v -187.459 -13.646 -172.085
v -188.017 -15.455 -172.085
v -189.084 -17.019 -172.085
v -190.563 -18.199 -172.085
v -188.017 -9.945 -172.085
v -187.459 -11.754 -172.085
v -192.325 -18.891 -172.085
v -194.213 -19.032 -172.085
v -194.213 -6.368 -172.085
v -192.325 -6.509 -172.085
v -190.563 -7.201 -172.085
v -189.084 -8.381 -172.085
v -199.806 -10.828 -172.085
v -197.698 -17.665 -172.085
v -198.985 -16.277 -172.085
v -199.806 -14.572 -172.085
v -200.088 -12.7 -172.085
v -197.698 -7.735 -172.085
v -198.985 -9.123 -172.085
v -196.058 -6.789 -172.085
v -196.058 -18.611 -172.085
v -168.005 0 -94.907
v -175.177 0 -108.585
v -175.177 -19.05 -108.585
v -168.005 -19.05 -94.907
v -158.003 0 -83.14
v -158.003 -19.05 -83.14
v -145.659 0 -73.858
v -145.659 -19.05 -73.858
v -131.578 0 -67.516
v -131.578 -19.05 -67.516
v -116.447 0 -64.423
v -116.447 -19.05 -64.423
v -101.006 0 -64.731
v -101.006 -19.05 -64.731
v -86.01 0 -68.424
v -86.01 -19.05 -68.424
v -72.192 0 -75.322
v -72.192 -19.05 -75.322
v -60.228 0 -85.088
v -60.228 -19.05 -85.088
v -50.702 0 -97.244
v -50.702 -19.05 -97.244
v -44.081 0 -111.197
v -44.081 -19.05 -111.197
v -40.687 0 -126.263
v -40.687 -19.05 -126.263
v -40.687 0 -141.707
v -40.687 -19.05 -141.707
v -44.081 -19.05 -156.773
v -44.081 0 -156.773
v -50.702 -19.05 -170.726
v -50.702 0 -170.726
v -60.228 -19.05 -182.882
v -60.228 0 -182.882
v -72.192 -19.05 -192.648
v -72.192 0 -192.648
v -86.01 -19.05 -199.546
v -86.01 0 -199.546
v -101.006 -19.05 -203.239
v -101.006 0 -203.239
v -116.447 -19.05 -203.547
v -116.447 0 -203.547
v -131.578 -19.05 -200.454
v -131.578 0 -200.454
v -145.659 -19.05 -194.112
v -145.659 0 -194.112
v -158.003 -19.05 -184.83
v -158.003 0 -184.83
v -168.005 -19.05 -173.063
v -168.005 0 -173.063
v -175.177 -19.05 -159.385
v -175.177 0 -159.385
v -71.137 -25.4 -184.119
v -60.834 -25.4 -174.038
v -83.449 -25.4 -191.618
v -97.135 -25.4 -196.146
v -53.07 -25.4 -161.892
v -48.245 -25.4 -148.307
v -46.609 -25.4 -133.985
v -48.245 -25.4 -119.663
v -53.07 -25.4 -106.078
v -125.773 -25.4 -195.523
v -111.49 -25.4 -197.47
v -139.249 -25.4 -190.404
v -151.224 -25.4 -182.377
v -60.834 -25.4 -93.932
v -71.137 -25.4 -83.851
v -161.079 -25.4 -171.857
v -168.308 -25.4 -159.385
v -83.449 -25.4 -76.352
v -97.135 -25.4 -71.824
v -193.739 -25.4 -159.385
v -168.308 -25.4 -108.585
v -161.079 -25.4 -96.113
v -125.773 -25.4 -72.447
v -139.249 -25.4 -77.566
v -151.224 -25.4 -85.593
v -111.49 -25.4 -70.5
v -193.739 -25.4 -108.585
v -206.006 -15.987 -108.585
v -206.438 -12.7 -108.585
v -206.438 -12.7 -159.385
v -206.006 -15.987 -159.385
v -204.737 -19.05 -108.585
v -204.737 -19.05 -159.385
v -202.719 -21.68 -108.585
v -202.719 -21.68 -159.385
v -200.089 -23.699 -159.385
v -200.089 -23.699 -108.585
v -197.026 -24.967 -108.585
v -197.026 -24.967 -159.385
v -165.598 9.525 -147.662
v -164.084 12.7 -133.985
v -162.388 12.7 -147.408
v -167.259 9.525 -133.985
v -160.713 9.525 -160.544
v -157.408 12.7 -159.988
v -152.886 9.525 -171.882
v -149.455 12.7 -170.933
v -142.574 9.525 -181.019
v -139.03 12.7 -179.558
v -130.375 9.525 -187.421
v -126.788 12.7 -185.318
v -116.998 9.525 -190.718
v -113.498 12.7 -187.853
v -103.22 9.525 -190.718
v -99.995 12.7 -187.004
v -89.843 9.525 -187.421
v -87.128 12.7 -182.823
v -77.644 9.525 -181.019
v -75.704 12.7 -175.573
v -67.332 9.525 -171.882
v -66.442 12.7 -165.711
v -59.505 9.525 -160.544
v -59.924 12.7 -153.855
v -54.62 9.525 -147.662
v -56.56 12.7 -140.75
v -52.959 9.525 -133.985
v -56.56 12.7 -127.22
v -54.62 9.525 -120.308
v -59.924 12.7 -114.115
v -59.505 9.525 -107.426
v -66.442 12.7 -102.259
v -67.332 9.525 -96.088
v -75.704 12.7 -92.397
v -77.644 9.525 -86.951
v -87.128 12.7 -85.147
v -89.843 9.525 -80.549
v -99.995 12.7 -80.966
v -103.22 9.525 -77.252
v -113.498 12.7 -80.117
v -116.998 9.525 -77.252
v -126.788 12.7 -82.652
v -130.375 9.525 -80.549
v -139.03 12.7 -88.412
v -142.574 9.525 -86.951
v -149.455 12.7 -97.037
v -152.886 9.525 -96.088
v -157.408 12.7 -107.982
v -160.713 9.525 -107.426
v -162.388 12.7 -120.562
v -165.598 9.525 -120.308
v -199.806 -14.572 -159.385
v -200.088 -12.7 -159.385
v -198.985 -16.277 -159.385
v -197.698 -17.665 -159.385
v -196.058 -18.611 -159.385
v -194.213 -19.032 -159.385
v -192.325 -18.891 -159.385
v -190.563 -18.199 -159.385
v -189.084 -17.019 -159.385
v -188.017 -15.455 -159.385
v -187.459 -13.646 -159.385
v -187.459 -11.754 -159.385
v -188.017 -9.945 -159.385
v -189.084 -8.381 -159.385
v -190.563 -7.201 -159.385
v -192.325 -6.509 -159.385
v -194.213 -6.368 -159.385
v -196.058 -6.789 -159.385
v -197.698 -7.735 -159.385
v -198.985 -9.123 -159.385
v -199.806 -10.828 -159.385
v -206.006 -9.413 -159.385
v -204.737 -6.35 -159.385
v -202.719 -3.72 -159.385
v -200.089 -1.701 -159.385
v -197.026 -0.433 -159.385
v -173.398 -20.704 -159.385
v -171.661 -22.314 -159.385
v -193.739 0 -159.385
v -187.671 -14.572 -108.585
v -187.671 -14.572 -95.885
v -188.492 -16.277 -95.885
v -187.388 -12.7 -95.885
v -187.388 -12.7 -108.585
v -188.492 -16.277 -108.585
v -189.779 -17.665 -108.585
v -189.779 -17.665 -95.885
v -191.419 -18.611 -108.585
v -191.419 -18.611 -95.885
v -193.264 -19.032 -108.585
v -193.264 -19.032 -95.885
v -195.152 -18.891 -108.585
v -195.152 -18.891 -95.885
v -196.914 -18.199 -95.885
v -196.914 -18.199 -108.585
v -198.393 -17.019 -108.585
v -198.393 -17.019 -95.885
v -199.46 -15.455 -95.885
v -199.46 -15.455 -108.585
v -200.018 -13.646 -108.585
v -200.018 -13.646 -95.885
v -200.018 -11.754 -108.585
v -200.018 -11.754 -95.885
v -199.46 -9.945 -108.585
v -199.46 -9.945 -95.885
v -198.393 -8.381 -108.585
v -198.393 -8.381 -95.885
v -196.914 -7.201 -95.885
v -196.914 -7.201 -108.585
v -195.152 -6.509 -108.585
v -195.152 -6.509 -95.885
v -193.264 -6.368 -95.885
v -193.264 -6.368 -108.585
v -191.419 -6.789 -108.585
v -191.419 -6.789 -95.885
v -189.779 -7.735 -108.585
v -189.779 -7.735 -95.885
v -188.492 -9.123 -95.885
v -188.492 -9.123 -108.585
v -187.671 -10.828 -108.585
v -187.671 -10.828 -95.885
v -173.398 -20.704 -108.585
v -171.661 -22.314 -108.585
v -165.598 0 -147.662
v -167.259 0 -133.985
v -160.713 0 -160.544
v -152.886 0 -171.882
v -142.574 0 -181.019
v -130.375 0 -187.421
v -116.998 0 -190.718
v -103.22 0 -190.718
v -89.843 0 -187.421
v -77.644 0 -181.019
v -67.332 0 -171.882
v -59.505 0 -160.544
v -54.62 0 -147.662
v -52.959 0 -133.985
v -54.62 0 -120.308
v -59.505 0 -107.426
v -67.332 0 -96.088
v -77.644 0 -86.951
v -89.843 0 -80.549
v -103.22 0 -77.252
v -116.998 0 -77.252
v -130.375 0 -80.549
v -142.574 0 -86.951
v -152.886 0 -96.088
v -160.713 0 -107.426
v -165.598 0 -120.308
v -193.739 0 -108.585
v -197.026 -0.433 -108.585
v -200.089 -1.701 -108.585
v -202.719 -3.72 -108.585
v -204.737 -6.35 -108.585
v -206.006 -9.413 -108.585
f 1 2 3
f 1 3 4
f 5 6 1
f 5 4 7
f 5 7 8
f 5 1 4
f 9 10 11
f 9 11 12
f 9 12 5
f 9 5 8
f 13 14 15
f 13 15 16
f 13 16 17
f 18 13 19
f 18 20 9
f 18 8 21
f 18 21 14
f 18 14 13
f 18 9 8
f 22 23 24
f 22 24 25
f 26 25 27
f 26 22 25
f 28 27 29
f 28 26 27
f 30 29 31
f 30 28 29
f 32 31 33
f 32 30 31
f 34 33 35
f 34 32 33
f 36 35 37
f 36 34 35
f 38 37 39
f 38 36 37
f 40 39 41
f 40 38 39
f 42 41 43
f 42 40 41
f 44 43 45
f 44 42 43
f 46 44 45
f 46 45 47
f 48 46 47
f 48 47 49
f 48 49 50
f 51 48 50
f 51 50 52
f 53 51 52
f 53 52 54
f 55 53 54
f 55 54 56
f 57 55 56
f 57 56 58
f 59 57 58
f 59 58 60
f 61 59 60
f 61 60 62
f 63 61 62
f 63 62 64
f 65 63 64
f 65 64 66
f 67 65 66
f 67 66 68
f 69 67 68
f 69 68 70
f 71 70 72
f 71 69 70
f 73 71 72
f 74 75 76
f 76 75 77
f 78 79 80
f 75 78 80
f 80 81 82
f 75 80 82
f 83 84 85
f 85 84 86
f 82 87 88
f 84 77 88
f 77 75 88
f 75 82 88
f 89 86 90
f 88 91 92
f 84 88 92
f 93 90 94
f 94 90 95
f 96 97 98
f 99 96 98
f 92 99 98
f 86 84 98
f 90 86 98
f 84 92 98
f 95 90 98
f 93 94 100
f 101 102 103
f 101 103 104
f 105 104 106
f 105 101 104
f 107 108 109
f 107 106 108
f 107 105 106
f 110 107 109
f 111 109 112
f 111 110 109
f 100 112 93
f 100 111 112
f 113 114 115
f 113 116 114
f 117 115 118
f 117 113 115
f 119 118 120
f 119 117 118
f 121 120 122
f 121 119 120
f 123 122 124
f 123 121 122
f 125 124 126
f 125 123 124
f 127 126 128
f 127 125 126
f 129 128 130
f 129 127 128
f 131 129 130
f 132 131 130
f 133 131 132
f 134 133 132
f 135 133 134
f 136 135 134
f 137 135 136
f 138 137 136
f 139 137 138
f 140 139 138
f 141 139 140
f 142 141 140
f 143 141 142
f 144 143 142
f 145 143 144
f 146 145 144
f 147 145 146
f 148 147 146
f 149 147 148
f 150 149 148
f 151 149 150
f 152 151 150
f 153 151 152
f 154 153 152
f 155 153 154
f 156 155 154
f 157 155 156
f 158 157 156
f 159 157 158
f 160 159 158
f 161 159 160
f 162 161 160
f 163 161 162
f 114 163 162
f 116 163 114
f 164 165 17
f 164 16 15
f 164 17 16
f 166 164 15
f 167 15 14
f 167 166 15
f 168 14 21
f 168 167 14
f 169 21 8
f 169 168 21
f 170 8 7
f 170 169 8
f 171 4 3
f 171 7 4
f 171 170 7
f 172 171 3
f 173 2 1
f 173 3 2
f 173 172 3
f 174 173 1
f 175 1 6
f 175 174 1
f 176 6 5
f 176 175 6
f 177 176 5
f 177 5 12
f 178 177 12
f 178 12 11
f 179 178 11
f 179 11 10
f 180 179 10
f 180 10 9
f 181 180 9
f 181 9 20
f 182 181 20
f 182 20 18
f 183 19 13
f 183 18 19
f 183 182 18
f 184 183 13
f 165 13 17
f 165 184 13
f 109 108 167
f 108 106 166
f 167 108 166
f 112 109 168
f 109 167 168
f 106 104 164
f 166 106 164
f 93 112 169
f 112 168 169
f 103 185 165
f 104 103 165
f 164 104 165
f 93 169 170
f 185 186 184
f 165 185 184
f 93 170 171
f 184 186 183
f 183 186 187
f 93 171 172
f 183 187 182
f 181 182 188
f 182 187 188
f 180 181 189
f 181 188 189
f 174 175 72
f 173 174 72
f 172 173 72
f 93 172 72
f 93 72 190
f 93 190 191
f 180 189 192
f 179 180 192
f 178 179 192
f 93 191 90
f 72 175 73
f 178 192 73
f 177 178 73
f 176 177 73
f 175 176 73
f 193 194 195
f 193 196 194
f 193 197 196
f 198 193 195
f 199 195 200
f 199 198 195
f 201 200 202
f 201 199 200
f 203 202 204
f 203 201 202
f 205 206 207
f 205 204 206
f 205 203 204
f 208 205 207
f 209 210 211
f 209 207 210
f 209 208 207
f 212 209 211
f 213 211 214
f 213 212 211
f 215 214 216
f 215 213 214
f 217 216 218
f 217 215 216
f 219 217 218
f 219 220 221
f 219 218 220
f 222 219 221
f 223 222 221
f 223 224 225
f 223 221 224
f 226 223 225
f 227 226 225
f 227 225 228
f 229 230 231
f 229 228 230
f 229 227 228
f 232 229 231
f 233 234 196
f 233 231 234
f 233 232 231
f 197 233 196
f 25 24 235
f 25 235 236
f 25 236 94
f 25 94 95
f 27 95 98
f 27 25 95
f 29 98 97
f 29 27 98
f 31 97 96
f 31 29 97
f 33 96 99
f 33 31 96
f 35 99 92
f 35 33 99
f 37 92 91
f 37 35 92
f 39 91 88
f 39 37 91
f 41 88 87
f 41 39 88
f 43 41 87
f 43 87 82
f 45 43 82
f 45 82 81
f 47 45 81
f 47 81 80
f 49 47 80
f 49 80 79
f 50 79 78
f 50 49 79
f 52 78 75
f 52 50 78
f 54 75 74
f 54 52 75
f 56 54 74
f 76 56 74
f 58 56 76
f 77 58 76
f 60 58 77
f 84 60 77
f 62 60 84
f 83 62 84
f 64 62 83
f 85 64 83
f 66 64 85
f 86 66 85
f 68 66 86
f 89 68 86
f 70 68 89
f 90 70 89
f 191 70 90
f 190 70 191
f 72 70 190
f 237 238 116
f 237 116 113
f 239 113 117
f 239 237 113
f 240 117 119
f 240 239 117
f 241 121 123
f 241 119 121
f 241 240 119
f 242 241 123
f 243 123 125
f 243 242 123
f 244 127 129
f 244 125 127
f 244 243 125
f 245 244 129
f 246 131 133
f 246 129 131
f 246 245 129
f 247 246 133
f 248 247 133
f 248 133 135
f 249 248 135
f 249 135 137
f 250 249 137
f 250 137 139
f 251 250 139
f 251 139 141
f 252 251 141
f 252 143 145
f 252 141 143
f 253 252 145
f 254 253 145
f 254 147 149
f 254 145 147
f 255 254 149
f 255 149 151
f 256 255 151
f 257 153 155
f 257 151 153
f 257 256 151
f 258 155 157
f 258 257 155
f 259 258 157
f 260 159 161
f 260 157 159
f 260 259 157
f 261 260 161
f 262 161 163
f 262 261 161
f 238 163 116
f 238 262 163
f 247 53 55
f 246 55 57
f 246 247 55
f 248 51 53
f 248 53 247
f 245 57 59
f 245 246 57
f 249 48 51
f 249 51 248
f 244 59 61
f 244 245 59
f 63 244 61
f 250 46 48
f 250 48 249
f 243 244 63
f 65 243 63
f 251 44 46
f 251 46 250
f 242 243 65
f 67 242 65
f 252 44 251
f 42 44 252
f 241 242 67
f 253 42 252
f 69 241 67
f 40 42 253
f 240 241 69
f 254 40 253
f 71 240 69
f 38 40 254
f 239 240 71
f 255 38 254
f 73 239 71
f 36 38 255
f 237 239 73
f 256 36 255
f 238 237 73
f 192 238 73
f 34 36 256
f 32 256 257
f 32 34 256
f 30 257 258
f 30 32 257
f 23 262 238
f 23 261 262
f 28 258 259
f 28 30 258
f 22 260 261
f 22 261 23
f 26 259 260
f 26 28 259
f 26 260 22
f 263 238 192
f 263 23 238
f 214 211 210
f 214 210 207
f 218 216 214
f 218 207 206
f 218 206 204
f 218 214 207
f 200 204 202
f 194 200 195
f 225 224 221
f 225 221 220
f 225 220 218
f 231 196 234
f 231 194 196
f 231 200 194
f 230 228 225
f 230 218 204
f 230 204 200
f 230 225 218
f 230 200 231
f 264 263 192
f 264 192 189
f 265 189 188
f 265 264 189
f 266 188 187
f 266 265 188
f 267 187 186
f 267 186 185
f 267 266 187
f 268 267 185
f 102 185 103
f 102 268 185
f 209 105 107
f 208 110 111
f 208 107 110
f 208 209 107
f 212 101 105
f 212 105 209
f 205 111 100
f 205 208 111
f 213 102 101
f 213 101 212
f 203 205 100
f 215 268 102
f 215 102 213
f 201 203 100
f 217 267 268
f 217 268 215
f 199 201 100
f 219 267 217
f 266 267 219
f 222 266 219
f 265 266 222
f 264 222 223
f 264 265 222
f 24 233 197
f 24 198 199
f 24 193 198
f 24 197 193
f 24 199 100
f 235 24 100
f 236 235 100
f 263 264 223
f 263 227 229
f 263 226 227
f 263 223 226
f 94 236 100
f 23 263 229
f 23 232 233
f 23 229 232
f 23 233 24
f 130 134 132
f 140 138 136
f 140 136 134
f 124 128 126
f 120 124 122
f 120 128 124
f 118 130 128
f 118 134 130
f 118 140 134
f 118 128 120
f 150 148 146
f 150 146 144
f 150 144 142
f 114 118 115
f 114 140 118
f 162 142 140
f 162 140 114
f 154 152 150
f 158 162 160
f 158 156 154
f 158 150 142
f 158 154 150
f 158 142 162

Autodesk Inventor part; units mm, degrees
ref_plane "YZ Plane" through (0, 0, 0) normal (1, 0, 0) x (0, 1, 0)
ref_plane "XZ Plane" through (0, 0, 0) normal (0, 1, 0) x (-1, 0, 0)
ref_plane "XY Plane" through (0, 0, 0) normal (0, 0, 1) x (1, 0, 0)
sketch "Sketch1" plane through (0, 0, 0) normal (0, 1, 0) x (-1, 0, 0)
  circle A0 centre (110.109, -133.985) radius 57.15
  circle A1 centre (110.109, -133.985) radius 50.8
  circle A2 centre (110.109, -133.985) radius 69.85
  line L0 (206.4385, -159.385) -> (175.1771, -159.385)
  line L1 (206.4385, -159.385) -> (206.4385, -108.585)
  line L2 (206.4385, -108.585) -> (175.1771, -108.585)
  point P0 (0, 0)
  dimension "d51" = 139.7
  dimension "d11" = 114.3
  dimension "d12" = 101.6
extrude "Extrusion11" add sketch "Sketch1" against normal blind 25.4 contours A0 | A1 | A2 | A2 L2 L1 L0
extrude "Extrusion12" add sketch "Sketch1" along normal blind 12.7 contours A0 | A1
chamfer "Chamfer1" distance 3.175 angle 45 1 edges at (-52.959, 12.7, -133.985)
chamfer "Chamfer2" distance 6.35 angle 45 1 edges at (-40.259, -25.4, -133.985)
fillet "Fillet2" radius 12.7 2 edges at (-206.4385, -25.4, -133.985) (-206.4385, 0, -133.985)
sketch "Sketch5" plane through (-175.1771, -19.05, -108.585) normal (0, 0, 1) x (1, 0, 0)
  arc A0 (-18.5614, 19.05) -> (-18.5614, -6.35) centre (-18.5614, 6.35) ccw projected
  circle A1 centre (-18.5614, 6.35) radius 6.35
  point P0 (175.1771, 19.05)
  dimension "d63" = 12.7
extrude "Extrusion13" add sketch "Sketch5" along normal blind 12.7
sketch "Sketch6" plane through (-175.1771, -19.05, -159.385) normal (0, 0, -1) x (-1, 0, 0)
  arc A0 (18.5614, -6.35) -> (18.5614, 19.05) centre (18.5614, 6.35) ccw projected
  circle A1 centre (18.5614, 6.35) radius 6.35
  point P0 (-175.1771, 19.05)
  dimension "d66" = 12.7
extrude "Extrusion14" add sketch "Sketch6" along normal blind 12.7
properties part number "Access Hatch"
